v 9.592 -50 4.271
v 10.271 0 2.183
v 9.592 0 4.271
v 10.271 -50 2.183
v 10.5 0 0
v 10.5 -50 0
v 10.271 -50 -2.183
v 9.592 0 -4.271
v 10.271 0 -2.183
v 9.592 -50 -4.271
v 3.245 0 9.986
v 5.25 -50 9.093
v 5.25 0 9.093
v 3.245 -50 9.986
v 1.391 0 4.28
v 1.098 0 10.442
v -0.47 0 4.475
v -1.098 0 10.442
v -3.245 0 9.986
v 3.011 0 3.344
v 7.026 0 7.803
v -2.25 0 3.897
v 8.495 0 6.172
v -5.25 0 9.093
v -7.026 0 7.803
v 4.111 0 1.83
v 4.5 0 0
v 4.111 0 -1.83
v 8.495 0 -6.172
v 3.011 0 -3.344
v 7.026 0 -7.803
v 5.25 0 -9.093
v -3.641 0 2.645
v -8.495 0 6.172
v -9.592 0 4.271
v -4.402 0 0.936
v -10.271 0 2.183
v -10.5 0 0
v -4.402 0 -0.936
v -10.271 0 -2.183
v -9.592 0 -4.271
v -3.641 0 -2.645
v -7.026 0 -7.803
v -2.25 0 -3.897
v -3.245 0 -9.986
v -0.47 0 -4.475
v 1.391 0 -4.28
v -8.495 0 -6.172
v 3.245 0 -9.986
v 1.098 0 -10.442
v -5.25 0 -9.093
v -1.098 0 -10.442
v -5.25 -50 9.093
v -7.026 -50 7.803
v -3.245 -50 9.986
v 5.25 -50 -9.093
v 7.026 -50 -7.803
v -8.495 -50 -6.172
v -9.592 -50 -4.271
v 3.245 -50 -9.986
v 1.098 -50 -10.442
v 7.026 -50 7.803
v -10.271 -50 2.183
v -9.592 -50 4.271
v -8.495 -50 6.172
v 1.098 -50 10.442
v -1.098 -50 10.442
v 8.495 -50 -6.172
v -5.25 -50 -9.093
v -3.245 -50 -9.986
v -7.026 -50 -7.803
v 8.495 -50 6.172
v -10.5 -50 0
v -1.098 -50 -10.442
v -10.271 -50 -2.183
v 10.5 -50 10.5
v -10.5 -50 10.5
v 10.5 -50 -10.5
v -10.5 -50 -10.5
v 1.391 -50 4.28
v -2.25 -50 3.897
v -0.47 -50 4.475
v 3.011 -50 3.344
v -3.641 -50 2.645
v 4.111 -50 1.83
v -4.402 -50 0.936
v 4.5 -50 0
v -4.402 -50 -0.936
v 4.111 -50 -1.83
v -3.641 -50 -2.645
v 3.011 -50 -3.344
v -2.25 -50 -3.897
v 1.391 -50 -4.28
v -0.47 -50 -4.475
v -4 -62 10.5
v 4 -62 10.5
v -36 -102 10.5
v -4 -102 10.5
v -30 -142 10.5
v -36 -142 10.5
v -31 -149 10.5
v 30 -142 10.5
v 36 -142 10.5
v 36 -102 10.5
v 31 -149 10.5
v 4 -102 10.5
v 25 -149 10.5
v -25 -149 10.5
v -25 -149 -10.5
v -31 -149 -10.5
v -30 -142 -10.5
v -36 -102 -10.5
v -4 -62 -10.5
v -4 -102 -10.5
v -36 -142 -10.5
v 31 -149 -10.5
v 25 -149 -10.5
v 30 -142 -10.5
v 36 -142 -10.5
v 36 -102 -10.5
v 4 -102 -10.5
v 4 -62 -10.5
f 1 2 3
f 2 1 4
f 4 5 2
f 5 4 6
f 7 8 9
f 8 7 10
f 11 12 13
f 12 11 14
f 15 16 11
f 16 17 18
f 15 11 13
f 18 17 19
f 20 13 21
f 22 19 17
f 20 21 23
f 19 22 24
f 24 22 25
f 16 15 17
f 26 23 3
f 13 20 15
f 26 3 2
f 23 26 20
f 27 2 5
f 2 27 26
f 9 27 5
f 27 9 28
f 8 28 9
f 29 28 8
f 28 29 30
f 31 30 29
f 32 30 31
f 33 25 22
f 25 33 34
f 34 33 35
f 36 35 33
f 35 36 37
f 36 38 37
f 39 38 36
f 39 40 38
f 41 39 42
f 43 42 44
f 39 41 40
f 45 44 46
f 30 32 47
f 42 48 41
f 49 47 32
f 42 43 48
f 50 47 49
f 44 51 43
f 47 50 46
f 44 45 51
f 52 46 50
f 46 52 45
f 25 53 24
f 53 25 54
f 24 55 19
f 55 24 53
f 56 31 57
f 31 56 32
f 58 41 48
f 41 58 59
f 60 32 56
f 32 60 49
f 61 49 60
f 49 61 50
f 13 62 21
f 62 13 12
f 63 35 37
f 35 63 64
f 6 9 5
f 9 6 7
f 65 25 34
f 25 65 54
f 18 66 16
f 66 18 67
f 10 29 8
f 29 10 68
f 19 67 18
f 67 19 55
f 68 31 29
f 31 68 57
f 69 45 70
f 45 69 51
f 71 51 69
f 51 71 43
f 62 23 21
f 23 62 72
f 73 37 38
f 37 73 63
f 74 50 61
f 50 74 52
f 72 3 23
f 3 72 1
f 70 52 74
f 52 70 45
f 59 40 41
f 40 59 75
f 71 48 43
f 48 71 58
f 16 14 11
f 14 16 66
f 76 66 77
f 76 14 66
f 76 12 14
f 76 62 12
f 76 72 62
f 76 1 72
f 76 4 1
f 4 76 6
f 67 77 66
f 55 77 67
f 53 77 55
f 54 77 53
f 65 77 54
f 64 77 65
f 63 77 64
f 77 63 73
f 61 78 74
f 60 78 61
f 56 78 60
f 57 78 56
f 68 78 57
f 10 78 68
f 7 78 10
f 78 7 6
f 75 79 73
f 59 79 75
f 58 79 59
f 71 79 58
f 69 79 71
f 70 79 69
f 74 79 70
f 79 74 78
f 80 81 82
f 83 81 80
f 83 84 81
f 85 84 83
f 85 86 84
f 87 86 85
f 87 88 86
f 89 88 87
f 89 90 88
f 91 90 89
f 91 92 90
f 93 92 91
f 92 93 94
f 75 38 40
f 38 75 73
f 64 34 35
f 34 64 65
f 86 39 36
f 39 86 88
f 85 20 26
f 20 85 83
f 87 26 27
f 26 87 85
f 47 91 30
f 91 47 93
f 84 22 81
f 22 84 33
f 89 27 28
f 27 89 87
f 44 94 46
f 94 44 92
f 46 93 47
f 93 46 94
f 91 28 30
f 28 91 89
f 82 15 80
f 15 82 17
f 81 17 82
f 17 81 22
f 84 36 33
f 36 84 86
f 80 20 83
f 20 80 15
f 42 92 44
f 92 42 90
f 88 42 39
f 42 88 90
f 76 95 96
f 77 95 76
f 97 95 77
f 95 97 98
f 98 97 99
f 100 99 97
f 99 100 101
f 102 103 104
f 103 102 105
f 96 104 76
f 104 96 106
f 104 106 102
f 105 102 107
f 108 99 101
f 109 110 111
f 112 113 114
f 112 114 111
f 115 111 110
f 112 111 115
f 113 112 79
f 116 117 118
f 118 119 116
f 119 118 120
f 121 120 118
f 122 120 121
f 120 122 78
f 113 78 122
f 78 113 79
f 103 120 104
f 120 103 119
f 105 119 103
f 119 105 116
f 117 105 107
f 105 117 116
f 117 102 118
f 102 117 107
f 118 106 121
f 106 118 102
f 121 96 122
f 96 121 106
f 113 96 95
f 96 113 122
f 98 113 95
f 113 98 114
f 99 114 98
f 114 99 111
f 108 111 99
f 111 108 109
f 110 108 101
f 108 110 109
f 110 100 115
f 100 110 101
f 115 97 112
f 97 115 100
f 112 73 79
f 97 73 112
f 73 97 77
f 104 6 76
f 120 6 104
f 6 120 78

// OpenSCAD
strength = 6;
pole_radius = 4.5;
pole_mount_height = 50;

width = 60;
height = 40;
line_hole_height = 40;
line_hole_width = 8;
top_hook_height = 7;
top_hook_width = 5;
rotate([90,0,0]) {
difference() {
    cylinder(pole_mount_height,pole_radius+strength,pole_radius+strength);
    cylinder(pole_mount_height,pole_radius,pole_radius);
}

translate([0,pole_radius+strength,pole_mount_height]) { rotate([90,0,0]) {
linear_extrude(strength*2+pole_radius*2)polygon([
    [-pole_radius-strength,0],
    [-width/2-strength,strength*2+line_hole_height],
    [-width/2-strength,strength*2+line_hole_height+height],

//top hook
    [-width/2-strength+top_hook_width,strength*2+line_hole_height+height+top_hook_height],
    [-width/2-strength+top_hook_width+strength,strength*2+line_hole_height+height+top_hook_height],




    [-width/2,strength*2+line_hole_height+height],
    [-line_hole_width/2,strength*2+line_hole_height],
    
    [-line_hole_width/2,strength*2],
    [line_hole_width/2,strength*2],
    
    
    [line_hole_width/2,strength*2+line_hole_height],
    [width/2,strength*2+line_hole_height+height],

//top hook
    [width/2+strength-top_hook_width-strength,strength*2+line_hole_height+height+top_hook_height],
    [width/2+strength-top_hook_width,strength*2+line_hole_height+height+top_hook_height],


    [width/2+strength,strength*2+line_hole_height+height],
    [width/2+strength,strength*2+line_hole_height],
    [pole_radius+strength,0]
    ]);

}
}
}
